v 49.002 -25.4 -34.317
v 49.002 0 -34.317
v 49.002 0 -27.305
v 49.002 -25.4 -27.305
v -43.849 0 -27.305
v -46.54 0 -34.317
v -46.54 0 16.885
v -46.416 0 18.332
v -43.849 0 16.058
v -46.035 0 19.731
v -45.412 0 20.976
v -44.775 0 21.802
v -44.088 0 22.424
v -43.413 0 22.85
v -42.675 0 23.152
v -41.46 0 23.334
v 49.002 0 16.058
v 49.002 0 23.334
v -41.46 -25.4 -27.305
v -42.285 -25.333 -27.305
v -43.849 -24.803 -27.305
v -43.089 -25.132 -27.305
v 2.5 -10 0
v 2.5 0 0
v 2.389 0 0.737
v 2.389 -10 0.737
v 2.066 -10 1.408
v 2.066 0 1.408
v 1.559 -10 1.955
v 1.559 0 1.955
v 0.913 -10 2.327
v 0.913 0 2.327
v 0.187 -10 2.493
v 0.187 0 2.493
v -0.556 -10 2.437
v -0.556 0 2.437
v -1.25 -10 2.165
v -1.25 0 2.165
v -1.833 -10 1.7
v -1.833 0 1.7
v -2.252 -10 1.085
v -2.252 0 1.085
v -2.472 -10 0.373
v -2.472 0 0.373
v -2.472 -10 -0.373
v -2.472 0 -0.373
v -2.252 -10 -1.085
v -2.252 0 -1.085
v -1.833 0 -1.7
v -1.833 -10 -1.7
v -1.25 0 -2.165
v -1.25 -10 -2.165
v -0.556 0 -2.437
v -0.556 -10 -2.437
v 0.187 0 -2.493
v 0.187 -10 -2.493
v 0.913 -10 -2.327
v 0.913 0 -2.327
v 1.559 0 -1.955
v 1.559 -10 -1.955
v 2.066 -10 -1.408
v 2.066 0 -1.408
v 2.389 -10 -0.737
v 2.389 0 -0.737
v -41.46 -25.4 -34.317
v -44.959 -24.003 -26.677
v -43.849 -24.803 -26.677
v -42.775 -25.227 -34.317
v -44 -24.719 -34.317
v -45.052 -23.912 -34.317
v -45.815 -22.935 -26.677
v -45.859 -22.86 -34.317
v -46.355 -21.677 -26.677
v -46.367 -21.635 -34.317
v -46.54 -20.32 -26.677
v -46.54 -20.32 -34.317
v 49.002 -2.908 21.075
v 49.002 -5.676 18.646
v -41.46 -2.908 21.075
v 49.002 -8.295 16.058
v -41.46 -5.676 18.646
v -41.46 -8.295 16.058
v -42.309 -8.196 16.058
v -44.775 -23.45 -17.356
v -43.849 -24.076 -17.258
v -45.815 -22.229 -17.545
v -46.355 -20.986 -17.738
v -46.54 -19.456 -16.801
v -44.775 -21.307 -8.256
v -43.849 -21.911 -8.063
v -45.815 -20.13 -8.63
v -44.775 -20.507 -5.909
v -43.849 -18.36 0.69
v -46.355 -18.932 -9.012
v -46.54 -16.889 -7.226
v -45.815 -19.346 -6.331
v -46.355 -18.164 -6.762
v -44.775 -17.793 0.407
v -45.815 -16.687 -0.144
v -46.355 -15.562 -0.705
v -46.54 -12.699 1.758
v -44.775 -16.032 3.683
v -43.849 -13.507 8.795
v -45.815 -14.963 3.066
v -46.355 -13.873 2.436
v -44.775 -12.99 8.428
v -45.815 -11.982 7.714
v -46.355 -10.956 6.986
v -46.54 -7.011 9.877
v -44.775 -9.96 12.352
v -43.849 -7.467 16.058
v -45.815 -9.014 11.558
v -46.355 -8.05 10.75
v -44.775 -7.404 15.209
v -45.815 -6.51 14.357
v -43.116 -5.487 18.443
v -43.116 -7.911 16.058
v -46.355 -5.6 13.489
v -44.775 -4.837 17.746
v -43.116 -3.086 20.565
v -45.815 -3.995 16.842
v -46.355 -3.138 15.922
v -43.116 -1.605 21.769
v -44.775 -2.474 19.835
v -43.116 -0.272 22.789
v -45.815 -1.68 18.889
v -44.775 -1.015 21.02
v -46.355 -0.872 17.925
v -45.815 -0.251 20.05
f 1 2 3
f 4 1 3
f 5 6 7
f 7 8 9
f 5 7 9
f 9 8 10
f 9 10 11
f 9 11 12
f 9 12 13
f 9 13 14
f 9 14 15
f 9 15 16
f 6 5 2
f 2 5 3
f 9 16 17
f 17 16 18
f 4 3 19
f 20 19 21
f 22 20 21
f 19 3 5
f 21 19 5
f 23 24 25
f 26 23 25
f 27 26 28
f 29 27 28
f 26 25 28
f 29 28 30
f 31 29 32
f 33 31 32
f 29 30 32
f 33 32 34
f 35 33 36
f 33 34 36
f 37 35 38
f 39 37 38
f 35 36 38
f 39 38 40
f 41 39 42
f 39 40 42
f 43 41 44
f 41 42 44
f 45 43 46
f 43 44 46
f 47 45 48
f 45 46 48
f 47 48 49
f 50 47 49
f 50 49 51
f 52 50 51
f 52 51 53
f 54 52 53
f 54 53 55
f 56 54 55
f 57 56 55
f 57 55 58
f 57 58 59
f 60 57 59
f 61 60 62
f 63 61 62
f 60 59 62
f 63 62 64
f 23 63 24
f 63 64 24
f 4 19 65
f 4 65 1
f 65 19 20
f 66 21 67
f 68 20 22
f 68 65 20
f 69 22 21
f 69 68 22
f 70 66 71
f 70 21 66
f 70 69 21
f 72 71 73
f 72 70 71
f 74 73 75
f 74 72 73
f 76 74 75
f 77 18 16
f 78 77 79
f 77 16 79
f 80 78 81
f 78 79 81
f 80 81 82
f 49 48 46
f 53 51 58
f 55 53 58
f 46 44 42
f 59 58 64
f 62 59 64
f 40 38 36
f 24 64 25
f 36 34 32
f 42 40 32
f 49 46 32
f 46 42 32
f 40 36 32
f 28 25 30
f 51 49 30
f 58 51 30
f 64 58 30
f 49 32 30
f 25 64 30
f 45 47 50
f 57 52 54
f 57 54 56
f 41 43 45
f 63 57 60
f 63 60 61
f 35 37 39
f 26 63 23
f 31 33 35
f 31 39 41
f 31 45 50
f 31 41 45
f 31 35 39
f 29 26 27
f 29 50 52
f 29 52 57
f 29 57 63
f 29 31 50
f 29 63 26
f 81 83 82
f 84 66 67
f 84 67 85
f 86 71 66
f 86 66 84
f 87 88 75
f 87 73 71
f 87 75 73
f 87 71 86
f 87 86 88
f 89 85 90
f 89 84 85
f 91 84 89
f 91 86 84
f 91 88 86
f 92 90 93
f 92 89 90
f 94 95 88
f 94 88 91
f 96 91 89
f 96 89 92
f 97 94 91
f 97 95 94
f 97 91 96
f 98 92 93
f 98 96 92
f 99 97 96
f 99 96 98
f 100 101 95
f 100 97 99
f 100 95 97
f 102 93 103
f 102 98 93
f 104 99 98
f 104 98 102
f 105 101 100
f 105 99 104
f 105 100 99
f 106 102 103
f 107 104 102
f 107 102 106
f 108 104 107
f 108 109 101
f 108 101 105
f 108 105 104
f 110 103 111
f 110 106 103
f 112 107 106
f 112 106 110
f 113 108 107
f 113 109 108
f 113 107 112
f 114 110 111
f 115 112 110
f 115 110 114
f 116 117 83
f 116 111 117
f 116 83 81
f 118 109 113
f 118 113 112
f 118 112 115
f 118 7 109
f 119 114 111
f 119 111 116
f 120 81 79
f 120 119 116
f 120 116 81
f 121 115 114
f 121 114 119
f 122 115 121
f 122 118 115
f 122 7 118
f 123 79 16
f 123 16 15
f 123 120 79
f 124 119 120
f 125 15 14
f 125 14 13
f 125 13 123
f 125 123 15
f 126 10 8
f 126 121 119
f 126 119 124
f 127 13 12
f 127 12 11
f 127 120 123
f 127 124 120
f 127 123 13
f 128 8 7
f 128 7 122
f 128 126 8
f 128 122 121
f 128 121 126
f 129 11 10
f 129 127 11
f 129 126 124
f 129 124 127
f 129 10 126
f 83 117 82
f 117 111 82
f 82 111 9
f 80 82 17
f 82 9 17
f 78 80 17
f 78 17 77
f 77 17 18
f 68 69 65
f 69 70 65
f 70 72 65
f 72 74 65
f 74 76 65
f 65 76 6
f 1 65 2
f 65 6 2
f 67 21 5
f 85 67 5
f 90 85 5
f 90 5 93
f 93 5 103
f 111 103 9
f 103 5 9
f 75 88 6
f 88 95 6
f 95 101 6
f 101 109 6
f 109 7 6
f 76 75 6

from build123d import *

# Parameters (mm, degrees)
F0_R        = 2.5
F1_DEPTH    = 10
F3_DEPTH    = 25.4
F4_T1_DEPTH = 345.5970234227
F5_T1_DEPTH = 20.3399448702
F5_T4_ANGLE = 65.6015156343


# Not quite as in the source:
# - a fillet or chamfer that OpenCascade refuses, or shapes differently, is made with other operations: its cross-section is extruded or revolved along the edge and cut away or added


with BuildPart() as f1:
    # F0 (on Front) → F1 (new body)
    with BuildSketch(Plane.XZ):
        Circle(F0_R)
    extrude(amount=F1_DEPTH)


with BuildPart() as f3:
    # F2 (on Front) → F3 (new body)
    with BuildSketch(Plane.XZ):
        Polygon((-43.8486076891, -27.3053273559), (-43.8486076891, 16.0576831549), (49.0021444857, 16.0576831549), (49.0021444857, 23.334402591), (-46.5399287641, 23.334402591), (-46.5399287641, -34.3165323138), (49.0021444857, -34.3165323138), (49.0021444857, -27.3053273559), align=None)
    extrude(amount=F3_DEPTH)

    # F4: fillet of radius 61.9342347291 on 1 edges, made by hand

    # F4_s2 → F4_t1 (cut)
    with BuildSketch(Plane.YZ.offset(-171.5674038506)):
        with BuildLine():
            ThreePointArc((0, 23.334402591), (-18.6860935062, 1.369174822), (-25.4, -26.6765874436))
            Line((-25.4, -26.6765874436), (-25.4, 23.334402591))
            Line((-25.4, 23.334402591), (0, 23.334402591))
        make_face()
    extrude(amount=F4_T1_DEPTH, mode=Mode.SUBTRACT)

    # F5: fillet of radius 5.08 on 2 edges, made by hand

    # F5_s2 → F5_t1 (cut)
    with BuildSketch(Plane.XY.offset(-47.0165323138)):
        with BuildLine():
            ThreePointArc((-41.4599287641, -25.4), (-45.0520312125, -23.9121024484), (-46.5399287641, -20.32))
            Line((-46.5399287641, -20.32), (-46.5399287641, -25.4))
            Line((-46.5399287641, -25.4), (-41.4599287641, -25.4))
        make_face()
    extrude(amount=F5_T1_DEPTH, mode=Mode.SUBTRACT)

    # F5_s3 → F5_t4 (revolve, cut)
    with BuildSketch(Plane.XY.offset(-26.6765874438)):
        with BuildLine():
            ThreePointArc((-41.4599287641, -25.4), (-45.0520312125, -23.9121024484), (-46.5399287641, -20.32))
            Line((-46.5399287641, -20.32), (-46.5399287641, -25.4))
            Line((-46.5399287641, -25.4), (-41.4599287641, -25.4))
        make_face()
    revolve(axis=Axis((-46.5399287641, 36.5342347296, -26.6765874438), (-1, 0, 0)), revolution_arc=F5_T4_ANGLE, mode=Mode.SUBTRACT)


solid = Compound([f1.part, f3.part])
